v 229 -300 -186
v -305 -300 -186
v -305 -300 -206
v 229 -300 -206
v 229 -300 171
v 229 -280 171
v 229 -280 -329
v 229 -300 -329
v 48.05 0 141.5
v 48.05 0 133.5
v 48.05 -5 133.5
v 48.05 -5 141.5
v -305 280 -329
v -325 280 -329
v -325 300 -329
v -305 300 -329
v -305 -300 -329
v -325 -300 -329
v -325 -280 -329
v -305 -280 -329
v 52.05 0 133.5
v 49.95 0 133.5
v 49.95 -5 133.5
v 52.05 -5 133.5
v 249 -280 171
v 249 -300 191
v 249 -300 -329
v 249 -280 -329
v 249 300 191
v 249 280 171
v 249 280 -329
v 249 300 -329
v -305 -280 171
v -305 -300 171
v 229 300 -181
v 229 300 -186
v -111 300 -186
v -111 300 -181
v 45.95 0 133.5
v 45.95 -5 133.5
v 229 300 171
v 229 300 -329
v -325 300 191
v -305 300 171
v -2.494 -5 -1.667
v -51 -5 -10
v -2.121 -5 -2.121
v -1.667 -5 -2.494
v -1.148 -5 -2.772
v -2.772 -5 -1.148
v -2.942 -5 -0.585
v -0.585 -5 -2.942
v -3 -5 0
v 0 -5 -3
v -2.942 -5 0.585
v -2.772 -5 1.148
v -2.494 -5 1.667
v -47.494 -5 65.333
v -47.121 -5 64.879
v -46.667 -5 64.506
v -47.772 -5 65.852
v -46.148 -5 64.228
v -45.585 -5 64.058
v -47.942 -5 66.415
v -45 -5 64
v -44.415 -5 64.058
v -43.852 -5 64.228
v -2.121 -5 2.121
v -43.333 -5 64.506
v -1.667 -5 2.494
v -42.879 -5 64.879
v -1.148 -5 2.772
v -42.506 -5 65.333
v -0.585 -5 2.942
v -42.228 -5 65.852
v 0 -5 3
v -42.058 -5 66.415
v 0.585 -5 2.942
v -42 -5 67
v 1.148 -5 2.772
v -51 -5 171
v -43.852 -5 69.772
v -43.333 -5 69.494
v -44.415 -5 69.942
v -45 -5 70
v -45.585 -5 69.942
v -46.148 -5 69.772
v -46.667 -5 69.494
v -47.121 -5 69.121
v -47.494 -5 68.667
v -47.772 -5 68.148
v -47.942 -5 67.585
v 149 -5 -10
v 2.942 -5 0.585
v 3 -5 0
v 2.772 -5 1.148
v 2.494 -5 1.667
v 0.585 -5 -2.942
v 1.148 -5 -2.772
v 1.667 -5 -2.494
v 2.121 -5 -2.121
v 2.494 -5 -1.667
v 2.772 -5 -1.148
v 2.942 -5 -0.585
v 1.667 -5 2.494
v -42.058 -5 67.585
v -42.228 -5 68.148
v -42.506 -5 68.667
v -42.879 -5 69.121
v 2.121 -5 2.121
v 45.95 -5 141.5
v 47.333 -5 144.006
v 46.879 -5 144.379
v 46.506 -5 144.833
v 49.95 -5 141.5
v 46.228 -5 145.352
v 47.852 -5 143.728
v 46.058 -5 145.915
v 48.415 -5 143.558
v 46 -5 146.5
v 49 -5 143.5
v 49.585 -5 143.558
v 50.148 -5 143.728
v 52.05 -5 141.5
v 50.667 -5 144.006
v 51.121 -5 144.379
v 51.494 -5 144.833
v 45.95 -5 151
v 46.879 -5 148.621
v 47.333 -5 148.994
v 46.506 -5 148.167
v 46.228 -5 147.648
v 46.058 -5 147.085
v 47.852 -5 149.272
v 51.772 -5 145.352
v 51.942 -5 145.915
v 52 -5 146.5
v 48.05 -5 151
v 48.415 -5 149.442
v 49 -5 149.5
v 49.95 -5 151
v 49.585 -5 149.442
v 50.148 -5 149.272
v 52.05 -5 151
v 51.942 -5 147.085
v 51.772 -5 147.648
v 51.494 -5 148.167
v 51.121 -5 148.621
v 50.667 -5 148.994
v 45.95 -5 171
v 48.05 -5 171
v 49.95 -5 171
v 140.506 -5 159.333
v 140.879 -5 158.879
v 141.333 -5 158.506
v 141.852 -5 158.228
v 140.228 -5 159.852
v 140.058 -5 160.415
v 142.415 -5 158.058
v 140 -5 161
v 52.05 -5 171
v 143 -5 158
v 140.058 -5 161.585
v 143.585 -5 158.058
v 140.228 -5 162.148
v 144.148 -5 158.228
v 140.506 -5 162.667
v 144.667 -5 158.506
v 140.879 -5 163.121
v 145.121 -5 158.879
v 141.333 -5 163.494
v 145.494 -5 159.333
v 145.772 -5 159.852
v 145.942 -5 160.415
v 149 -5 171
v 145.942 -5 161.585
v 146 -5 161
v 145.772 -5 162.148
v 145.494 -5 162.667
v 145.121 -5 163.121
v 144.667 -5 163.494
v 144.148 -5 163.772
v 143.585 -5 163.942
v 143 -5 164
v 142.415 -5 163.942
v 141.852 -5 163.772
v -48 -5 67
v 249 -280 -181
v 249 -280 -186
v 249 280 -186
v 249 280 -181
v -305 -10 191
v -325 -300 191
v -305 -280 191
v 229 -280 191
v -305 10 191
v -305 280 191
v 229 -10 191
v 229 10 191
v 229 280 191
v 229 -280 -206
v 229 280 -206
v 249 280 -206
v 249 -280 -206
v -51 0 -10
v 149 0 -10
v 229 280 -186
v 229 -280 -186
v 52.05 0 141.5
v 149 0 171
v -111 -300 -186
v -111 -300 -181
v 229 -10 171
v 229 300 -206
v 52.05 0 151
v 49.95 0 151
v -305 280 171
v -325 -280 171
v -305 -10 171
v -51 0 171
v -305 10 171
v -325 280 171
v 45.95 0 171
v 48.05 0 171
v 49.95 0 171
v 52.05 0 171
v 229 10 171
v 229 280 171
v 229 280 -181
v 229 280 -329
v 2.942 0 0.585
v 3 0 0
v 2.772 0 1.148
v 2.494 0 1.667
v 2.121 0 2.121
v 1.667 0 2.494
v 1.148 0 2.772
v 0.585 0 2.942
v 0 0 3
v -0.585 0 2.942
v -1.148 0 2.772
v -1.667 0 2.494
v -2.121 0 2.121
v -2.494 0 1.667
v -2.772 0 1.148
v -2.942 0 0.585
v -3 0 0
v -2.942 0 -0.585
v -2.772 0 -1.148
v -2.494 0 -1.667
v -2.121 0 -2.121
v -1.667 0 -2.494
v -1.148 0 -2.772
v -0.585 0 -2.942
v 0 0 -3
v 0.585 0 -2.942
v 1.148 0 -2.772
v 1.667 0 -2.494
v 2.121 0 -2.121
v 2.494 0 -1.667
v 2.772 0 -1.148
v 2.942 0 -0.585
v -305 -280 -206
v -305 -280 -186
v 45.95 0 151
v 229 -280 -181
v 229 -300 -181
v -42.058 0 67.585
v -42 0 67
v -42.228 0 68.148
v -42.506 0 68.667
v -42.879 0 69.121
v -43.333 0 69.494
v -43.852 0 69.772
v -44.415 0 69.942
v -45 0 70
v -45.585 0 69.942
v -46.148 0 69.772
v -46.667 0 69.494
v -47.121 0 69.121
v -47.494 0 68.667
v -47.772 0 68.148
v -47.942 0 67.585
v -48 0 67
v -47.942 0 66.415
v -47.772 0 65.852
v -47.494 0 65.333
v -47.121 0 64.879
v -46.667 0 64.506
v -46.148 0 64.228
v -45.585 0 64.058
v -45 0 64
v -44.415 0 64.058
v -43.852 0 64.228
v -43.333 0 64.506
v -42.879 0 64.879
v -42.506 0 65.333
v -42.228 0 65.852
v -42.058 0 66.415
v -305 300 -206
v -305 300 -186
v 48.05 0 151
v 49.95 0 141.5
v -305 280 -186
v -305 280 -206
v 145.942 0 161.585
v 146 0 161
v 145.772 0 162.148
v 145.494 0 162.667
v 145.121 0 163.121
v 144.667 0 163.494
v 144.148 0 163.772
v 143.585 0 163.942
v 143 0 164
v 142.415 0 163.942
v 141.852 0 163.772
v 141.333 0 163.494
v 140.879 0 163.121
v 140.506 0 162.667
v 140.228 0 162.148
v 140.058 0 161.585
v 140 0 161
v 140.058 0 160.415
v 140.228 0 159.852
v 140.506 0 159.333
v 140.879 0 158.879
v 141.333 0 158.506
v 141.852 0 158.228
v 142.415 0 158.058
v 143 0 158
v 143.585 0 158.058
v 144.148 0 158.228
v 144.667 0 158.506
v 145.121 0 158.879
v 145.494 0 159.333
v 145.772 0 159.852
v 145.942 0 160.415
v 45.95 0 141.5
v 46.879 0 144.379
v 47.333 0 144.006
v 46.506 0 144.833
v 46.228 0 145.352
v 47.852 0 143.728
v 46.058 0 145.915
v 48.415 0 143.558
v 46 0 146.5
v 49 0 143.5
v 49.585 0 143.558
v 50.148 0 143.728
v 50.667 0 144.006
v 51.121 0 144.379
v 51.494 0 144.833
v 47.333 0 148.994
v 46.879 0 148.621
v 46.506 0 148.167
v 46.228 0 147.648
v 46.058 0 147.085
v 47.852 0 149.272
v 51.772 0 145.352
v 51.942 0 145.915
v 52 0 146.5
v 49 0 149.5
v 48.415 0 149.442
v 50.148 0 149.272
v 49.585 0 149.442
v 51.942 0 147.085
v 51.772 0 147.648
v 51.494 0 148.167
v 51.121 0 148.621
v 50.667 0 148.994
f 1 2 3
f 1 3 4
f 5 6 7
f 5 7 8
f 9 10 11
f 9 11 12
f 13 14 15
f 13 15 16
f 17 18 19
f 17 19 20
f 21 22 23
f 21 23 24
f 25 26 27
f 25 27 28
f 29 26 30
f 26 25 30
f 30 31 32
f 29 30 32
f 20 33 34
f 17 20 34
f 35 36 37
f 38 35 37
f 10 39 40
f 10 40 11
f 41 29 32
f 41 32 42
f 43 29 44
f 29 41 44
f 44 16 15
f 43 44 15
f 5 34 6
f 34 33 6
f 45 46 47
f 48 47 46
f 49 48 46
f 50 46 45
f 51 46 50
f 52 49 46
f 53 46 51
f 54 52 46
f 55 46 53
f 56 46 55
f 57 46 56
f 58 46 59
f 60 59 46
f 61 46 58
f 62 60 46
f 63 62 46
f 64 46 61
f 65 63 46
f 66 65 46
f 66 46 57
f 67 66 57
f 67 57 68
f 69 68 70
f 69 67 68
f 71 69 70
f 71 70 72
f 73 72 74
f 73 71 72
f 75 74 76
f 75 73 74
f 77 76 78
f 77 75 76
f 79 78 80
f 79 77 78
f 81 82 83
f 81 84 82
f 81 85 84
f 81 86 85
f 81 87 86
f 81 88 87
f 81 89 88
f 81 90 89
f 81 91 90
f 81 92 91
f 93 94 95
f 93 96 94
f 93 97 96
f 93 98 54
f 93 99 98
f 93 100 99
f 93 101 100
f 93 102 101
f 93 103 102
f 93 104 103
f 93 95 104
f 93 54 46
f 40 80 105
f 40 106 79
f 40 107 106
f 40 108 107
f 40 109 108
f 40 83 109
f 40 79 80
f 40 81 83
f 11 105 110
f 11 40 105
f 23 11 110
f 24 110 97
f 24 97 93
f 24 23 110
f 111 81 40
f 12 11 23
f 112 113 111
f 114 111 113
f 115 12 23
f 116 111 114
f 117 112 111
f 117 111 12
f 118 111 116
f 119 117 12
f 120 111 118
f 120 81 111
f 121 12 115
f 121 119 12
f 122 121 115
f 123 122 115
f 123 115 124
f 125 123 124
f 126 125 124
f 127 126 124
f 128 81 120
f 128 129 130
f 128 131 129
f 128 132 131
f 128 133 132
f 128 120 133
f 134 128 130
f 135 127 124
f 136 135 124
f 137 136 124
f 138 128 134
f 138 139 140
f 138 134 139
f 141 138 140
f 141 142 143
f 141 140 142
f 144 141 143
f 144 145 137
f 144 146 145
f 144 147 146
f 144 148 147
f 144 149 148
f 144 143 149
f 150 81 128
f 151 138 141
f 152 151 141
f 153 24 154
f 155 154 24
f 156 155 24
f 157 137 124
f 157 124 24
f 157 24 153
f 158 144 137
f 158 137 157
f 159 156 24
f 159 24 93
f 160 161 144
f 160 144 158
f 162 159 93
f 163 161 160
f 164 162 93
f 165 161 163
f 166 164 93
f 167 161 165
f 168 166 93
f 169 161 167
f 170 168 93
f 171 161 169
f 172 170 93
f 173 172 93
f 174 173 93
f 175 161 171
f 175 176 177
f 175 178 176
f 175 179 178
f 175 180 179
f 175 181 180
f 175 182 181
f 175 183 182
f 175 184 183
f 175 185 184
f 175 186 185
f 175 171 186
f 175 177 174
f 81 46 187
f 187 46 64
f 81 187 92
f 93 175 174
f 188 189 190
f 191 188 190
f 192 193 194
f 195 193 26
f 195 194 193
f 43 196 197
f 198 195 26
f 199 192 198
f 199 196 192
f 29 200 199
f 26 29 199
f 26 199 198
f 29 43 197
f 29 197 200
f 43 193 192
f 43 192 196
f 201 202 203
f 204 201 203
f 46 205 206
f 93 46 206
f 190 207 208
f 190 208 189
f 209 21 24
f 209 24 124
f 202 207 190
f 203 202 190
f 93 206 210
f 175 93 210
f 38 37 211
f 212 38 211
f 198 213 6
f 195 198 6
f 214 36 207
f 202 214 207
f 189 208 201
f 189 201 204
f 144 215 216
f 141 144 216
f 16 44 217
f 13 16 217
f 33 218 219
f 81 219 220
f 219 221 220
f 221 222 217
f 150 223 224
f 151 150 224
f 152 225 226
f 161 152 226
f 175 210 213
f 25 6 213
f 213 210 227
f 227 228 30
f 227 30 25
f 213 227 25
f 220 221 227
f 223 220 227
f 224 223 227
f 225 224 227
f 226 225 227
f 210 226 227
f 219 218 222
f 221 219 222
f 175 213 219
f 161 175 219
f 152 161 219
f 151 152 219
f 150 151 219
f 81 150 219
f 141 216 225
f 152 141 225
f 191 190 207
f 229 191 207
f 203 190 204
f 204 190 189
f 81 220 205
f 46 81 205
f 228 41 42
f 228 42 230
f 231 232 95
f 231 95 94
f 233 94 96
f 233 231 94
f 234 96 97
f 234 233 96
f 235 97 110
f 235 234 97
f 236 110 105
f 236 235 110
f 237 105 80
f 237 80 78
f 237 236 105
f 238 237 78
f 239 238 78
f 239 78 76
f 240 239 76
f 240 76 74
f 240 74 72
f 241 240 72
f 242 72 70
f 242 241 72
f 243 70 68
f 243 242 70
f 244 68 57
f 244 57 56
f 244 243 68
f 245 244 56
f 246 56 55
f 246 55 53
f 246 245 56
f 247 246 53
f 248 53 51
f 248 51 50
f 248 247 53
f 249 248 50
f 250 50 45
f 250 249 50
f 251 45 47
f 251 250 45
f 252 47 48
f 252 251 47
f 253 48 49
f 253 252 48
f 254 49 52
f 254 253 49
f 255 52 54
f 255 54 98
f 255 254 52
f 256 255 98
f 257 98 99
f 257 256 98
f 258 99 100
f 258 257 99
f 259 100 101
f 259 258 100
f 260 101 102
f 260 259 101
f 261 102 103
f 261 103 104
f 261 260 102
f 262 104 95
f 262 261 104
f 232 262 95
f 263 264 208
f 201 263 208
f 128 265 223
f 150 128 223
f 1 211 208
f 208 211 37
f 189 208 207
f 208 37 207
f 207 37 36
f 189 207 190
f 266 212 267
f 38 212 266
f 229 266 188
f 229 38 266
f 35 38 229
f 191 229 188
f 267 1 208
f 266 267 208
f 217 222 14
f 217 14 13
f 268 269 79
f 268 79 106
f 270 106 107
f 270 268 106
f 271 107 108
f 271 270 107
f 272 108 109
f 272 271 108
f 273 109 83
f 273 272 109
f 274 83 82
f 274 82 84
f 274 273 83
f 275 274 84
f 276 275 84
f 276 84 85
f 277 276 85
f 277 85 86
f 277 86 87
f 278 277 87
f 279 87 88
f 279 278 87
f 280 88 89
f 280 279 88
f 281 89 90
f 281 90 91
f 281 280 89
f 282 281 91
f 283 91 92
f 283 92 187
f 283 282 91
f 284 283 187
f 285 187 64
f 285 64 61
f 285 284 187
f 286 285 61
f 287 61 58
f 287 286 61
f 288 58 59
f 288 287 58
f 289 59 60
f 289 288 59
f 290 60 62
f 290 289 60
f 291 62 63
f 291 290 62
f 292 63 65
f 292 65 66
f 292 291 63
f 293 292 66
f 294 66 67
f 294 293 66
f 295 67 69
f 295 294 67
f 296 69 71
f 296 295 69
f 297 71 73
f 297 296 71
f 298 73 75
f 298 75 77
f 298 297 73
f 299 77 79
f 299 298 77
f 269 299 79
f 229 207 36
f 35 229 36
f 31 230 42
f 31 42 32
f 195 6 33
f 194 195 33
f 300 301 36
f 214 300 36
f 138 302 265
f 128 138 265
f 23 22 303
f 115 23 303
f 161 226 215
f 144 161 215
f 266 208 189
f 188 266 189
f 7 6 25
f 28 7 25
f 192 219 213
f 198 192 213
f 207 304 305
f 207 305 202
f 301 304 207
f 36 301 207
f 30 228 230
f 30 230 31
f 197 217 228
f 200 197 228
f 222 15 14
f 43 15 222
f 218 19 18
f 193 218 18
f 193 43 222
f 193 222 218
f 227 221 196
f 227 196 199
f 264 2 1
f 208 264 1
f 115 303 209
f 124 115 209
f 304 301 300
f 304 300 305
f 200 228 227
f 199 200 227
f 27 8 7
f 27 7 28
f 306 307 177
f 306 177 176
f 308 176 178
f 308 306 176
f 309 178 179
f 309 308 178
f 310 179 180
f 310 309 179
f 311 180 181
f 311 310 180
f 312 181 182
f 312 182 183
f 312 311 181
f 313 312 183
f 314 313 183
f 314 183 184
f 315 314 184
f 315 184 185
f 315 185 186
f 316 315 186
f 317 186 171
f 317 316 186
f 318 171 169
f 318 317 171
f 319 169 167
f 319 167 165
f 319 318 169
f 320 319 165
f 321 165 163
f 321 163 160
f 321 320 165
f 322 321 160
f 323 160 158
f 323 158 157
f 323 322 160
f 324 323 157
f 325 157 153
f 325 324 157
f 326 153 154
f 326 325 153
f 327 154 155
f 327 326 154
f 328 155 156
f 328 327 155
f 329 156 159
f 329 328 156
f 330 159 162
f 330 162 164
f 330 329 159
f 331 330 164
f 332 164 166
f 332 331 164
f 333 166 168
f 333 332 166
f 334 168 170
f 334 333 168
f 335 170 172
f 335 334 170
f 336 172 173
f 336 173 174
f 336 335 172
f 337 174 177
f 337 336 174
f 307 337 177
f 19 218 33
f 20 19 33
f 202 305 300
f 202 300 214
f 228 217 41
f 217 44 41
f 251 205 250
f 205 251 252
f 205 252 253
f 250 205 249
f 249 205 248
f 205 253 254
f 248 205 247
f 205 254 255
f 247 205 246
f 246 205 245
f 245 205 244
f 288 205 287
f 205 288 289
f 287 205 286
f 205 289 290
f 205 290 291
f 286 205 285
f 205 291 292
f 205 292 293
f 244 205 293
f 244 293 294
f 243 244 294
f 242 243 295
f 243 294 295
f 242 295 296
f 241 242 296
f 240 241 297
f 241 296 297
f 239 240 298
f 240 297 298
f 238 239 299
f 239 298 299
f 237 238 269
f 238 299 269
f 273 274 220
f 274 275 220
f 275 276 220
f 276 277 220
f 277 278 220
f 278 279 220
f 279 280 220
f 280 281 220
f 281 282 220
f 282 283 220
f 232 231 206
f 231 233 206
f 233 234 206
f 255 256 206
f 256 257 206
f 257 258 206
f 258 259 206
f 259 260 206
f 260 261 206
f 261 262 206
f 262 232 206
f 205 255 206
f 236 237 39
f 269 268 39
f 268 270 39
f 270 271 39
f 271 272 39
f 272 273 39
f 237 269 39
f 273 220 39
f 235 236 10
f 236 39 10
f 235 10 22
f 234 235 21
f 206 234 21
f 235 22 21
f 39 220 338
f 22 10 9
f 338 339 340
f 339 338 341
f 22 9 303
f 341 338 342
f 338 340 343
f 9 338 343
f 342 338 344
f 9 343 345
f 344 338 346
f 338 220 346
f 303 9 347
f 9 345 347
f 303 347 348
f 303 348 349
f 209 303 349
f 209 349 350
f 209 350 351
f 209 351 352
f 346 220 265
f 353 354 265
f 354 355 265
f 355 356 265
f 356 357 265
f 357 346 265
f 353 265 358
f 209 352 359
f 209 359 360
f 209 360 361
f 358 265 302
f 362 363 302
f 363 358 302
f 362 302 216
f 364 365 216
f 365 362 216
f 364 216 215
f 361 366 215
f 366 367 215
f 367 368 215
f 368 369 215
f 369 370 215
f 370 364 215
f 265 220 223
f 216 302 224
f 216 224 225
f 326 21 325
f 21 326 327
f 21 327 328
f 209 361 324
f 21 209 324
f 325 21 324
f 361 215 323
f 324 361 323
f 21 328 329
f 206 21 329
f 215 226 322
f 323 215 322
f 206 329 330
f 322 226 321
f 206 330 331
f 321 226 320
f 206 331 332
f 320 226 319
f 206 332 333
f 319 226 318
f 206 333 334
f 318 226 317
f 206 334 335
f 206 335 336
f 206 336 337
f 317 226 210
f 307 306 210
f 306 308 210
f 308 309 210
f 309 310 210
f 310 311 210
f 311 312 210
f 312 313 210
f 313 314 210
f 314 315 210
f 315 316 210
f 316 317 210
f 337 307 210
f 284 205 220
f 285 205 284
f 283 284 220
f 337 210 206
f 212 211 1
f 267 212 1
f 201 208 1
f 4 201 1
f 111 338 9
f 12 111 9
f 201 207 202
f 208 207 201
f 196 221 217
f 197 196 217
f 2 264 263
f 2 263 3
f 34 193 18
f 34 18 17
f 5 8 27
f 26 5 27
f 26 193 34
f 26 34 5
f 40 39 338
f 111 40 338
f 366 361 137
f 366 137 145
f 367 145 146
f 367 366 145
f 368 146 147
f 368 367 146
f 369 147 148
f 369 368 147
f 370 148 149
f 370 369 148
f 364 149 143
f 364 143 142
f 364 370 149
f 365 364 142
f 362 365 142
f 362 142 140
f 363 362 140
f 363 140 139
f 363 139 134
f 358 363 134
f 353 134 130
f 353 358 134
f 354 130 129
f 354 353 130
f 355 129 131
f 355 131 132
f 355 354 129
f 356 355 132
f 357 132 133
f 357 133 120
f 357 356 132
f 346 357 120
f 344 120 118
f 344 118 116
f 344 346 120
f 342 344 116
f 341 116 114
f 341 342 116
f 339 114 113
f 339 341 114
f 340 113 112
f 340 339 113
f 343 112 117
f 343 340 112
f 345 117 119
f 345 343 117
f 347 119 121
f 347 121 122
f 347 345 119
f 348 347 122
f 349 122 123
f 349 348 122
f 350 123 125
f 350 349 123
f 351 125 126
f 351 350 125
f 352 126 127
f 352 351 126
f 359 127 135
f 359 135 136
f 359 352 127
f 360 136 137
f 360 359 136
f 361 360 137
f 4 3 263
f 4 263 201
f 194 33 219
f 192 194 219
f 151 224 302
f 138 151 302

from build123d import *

# Parameters (mm, degrees)
F0_R      = 3
F0_W      = 2.1
F0_H      = 8
F1_DEPTH  = 5
F3_W      = 534
F3_H      = 20
F4_DEPTH  = 20
F5_W      = 20
F5_H      = 20
F6_DEPTH  = 500
F9_DEPTH  = 5
F10_W     = 534
F10_H     = 20
F10_W_2   = 20
F10_H_2   = 560
F11_DEPTH = 20


with BuildPart() as f1:
    # F0 (on Front) → F1 (new body)
    with BuildSketch(Plane.XZ):
        Polygon((-51, 171), (-51, -10), (149, -10), (149, 171), (52.05, 171), (52.05, 151), (49.95, 151), (49.95, 171), (48.05, 171), (48.05, 151), (45.95, 151), (45.95, 171), align=None)
        Circle(F0_R, mode=Mode.SUBTRACT)
        with Locations((-45, 67)):
            Circle(F0_R, mode=Mode.SUBTRACT)
        with Locations((47, 137.5)):
            Rectangle(F0_W, F0_H, mode=Mode.SUBTRACT)
        with Locations((51, 137.5)):
            Rectangle(F0_W, F0_H, mode=Mode.SUBTRACT)
        with Locations((49, 146.5)):
            Circle(F0_R, mode=Mode.SUBTRACT)
        with Locations((143, 161)):
            Circle(F0_R, mode=Mode.SUBTRACT)
    extrude(amount=F1_DEPTH)

    # F3 (on offset) → F4 (join)
    with BuildSketch(Plane.XY.offset(171)):
        Polygon((229, -300), (249, -300), (249, 300), (229, 300), (-305, 300), (-325, 300), (-325, -300), (-305, -300), align=None)
        Polygon((229, -10), (229, -280), (-305, -280), (-305, -10), (-305, 10), (-305, 280), (229, 280), (229, 10), align=None, mode=Mode.SUBTRACT)
        with Locations((-38, 0)):
            Rectangle(F3_W, F3_H)
    extrude(amount=F4_DEPTH)

    # F5 (on face) → F6 (join)
    with BuildSketch(Plane(origin=(0, 0, 171), x_dir=(1, 0, 0), z_dir=(0, 0, -1))):
        with Locations((-315, 290)):
            Rectangle(F5_W, F5_H)
        with Locations((-315, -290)):
            Rectangle(F5_W, F5_H)
        with Locations((239, -290)):
            Rectangle(F5_W, F5_H)
        with Locations((239, 290)):
            Rectangle(F5_W, F5_H)
    extrude(amount=F6_DEPTH)


with BuildPart() as f9:
    # F8 (on offset) → F9 (new body)
    with BuildSketch(Plane.XY.offset(-186)):
        Polygon((229, 280), (229, 300), (-111, 300), (-111, -300), (229, -300), (229, -280), (249, -280), (249, 280), align=None)
    extrude(amount=F9_DEPTH)


with BuildPart() as f11:
    # F10 (on face) → F11 (new body)
    with BuildSketch(Plane(origin=(0, 0, -186), x_dir=(1, 0, 0), z_dir=(0, 0, -1))):
        with Locations((-38, -290)):
            Rectangle(F10_W, F10_H)
        with Locations((239, 0)):
            Rectangle(F10_W_2, F10_H_2)
        with Locations((-38, 290)):
            Rectangle(F10_W, F10_H)
    extrude(amount=F11_DEPTH)


solid = Compound([f1.part, f9.part, f11.part])
